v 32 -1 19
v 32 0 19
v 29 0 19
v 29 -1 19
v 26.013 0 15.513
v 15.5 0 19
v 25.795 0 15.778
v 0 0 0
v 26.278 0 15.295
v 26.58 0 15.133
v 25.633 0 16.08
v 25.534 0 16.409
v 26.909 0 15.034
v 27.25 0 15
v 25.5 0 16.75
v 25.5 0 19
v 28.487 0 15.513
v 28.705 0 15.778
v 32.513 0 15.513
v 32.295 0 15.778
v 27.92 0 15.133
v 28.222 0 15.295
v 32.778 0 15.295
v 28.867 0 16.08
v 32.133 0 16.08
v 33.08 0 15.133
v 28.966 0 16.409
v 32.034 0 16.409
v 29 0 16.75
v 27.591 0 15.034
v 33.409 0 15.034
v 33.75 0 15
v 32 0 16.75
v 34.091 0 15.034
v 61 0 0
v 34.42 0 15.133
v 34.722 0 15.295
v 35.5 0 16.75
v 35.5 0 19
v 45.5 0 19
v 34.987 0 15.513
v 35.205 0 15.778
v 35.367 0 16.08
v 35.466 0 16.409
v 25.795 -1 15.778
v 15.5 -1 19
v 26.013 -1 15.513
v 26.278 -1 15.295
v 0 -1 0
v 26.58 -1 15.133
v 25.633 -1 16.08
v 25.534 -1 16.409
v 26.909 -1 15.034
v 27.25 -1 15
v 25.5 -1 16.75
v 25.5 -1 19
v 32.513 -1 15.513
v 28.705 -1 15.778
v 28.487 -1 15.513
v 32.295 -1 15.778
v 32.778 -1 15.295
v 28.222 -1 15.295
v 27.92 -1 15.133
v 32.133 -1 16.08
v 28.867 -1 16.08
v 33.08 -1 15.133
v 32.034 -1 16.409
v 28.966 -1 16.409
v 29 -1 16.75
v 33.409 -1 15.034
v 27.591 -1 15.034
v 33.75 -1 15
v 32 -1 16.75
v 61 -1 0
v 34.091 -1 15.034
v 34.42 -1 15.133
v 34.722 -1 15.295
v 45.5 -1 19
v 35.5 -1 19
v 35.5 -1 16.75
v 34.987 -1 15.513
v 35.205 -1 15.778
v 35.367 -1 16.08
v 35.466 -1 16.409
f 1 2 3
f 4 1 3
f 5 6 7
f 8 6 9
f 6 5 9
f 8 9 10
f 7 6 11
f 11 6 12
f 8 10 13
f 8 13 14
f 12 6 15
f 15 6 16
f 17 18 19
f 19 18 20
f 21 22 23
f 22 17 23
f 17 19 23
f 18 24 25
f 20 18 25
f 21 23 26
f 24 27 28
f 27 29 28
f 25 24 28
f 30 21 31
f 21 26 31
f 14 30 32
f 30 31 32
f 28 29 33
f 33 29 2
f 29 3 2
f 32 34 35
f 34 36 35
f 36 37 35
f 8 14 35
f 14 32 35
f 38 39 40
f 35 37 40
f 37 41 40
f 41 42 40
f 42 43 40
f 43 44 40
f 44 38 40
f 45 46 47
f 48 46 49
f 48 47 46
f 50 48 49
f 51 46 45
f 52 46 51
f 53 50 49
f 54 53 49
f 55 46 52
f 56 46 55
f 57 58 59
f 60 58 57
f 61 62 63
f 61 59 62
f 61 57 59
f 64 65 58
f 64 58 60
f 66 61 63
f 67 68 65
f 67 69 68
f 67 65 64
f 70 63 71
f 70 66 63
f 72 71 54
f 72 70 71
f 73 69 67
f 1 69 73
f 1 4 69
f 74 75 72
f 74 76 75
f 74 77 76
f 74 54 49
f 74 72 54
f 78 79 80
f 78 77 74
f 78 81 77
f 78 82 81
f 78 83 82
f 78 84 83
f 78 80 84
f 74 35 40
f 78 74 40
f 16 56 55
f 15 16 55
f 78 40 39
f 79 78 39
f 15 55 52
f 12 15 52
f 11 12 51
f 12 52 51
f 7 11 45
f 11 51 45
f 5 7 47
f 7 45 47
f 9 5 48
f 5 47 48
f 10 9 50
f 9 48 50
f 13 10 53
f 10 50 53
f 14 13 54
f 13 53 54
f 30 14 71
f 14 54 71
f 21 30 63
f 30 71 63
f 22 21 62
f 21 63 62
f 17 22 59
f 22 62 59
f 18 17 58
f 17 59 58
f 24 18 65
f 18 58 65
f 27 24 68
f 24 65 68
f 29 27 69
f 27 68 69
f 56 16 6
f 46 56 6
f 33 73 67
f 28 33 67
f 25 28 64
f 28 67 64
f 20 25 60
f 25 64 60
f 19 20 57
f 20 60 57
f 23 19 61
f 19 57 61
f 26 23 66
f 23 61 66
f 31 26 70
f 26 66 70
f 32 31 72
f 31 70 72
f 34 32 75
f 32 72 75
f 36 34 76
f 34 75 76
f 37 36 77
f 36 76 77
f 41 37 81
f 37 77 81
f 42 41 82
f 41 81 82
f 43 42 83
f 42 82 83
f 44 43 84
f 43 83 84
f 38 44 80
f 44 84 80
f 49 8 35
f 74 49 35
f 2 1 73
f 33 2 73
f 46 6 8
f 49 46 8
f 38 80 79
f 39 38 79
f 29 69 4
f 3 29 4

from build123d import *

# Parameters (mm, degrees)
F1_DEPTH = 1
F3_DEPTH = 25


with BuildPart() as f1:
    # F0 (on Front) → F1 (new body)
    with BuildSketch(Plane.XZ):
        Polygon((15.5, 19), (0, 0), (30.5, 0), (30.5, 19), align=None)
        Polygon((30.5, 19), (30.5, 0), (61, 0), (45.5, 19), align=None)
    extrude(amount=F1_DEPTH)

    # F2 (on face) → F3 (cut)
    with BuildSketch(Plane.XZ.offset(1)):
        with BuildLine():
            ThreePointArc((25.5, 16.75), (27.25, 15), (29, 16.75))
            ThreePointArc((29, 16.75), (27.25, 18.5), (25.5, 16.75))
        make_face()
        with BuildLine():
            ThreePointArc((35.5, 16.75), (33.75, 18.5), (32, 16.75))
            ThreePointArc((32, 16.75), (33.75, 15), (35.5, 16.75))
        make_face()
        with BuildLine():
            Line((35.5, 19), (32, 19))
            Line((32, 19), (32, 16.75))
            ThreePointArc((32, 16.75), (33.75, 18.5), (35.5, 16.75))
            Line((35.5, 16.75), (35.5, 19))
        make_face()
        with BuildLine():
            Line((29, 16.75), (29, 19))
            Line((29, 19), (25.5, 19))
            Line((25.5, 19), (25.5, 16.75))
            ThreePointArc((25.5, 16.75), (27.25, 18.5), (29, 16.75))
        make_face()
    extrude(amount=-F3_DEPTH, mode=Mode.SUBTRACT)


solid = f1.part
